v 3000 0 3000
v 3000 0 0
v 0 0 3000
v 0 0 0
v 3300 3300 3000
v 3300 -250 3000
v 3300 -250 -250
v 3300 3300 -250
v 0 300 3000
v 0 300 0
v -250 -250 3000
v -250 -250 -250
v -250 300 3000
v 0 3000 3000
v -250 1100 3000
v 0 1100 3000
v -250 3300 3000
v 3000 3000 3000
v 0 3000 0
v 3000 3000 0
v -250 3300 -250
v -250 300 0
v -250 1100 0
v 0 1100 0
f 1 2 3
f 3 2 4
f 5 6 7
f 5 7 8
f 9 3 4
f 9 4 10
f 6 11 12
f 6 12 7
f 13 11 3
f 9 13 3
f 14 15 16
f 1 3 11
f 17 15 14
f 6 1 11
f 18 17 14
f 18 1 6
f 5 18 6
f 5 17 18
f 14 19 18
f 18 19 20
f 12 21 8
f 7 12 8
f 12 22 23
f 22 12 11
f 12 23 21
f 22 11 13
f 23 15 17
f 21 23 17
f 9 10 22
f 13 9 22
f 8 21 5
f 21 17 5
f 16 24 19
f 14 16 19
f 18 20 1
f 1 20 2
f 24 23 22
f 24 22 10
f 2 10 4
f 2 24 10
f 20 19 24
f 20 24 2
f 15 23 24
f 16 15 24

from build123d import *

# Parameters (mm, degrees)
F1_DEPTH = 3000
F2_W     = 3550
F2_H     = 3550
F3_DEPTH = 250


# Not quite as in the source:
# - a feature names something its author has since deleted; it is built from what else it names


with BuildPart() as f1:
    # F0 (on Top) → F1 (new body)
    with BuildSketch(Plane.XY):
        Polygon((3000, 0), (0, 0), (0, 300), (-250, 300), (-250, -250), (3300, -250), (3300, 3300), (-250, 3300), (-250, 1100), (0, 1100), (0, 3000), (3000, 3000), align=None)
    extrude(amount=F1_DEPTH)

    # F2 (on Top) → F3 (join)
    with BuildSketch(Plane.XY):
        with Locations((1525, 1525)):
            Rectangle(F2_W, F2_H)
    extrude(amount=-F3_DEPTH)


solid = f1.part
